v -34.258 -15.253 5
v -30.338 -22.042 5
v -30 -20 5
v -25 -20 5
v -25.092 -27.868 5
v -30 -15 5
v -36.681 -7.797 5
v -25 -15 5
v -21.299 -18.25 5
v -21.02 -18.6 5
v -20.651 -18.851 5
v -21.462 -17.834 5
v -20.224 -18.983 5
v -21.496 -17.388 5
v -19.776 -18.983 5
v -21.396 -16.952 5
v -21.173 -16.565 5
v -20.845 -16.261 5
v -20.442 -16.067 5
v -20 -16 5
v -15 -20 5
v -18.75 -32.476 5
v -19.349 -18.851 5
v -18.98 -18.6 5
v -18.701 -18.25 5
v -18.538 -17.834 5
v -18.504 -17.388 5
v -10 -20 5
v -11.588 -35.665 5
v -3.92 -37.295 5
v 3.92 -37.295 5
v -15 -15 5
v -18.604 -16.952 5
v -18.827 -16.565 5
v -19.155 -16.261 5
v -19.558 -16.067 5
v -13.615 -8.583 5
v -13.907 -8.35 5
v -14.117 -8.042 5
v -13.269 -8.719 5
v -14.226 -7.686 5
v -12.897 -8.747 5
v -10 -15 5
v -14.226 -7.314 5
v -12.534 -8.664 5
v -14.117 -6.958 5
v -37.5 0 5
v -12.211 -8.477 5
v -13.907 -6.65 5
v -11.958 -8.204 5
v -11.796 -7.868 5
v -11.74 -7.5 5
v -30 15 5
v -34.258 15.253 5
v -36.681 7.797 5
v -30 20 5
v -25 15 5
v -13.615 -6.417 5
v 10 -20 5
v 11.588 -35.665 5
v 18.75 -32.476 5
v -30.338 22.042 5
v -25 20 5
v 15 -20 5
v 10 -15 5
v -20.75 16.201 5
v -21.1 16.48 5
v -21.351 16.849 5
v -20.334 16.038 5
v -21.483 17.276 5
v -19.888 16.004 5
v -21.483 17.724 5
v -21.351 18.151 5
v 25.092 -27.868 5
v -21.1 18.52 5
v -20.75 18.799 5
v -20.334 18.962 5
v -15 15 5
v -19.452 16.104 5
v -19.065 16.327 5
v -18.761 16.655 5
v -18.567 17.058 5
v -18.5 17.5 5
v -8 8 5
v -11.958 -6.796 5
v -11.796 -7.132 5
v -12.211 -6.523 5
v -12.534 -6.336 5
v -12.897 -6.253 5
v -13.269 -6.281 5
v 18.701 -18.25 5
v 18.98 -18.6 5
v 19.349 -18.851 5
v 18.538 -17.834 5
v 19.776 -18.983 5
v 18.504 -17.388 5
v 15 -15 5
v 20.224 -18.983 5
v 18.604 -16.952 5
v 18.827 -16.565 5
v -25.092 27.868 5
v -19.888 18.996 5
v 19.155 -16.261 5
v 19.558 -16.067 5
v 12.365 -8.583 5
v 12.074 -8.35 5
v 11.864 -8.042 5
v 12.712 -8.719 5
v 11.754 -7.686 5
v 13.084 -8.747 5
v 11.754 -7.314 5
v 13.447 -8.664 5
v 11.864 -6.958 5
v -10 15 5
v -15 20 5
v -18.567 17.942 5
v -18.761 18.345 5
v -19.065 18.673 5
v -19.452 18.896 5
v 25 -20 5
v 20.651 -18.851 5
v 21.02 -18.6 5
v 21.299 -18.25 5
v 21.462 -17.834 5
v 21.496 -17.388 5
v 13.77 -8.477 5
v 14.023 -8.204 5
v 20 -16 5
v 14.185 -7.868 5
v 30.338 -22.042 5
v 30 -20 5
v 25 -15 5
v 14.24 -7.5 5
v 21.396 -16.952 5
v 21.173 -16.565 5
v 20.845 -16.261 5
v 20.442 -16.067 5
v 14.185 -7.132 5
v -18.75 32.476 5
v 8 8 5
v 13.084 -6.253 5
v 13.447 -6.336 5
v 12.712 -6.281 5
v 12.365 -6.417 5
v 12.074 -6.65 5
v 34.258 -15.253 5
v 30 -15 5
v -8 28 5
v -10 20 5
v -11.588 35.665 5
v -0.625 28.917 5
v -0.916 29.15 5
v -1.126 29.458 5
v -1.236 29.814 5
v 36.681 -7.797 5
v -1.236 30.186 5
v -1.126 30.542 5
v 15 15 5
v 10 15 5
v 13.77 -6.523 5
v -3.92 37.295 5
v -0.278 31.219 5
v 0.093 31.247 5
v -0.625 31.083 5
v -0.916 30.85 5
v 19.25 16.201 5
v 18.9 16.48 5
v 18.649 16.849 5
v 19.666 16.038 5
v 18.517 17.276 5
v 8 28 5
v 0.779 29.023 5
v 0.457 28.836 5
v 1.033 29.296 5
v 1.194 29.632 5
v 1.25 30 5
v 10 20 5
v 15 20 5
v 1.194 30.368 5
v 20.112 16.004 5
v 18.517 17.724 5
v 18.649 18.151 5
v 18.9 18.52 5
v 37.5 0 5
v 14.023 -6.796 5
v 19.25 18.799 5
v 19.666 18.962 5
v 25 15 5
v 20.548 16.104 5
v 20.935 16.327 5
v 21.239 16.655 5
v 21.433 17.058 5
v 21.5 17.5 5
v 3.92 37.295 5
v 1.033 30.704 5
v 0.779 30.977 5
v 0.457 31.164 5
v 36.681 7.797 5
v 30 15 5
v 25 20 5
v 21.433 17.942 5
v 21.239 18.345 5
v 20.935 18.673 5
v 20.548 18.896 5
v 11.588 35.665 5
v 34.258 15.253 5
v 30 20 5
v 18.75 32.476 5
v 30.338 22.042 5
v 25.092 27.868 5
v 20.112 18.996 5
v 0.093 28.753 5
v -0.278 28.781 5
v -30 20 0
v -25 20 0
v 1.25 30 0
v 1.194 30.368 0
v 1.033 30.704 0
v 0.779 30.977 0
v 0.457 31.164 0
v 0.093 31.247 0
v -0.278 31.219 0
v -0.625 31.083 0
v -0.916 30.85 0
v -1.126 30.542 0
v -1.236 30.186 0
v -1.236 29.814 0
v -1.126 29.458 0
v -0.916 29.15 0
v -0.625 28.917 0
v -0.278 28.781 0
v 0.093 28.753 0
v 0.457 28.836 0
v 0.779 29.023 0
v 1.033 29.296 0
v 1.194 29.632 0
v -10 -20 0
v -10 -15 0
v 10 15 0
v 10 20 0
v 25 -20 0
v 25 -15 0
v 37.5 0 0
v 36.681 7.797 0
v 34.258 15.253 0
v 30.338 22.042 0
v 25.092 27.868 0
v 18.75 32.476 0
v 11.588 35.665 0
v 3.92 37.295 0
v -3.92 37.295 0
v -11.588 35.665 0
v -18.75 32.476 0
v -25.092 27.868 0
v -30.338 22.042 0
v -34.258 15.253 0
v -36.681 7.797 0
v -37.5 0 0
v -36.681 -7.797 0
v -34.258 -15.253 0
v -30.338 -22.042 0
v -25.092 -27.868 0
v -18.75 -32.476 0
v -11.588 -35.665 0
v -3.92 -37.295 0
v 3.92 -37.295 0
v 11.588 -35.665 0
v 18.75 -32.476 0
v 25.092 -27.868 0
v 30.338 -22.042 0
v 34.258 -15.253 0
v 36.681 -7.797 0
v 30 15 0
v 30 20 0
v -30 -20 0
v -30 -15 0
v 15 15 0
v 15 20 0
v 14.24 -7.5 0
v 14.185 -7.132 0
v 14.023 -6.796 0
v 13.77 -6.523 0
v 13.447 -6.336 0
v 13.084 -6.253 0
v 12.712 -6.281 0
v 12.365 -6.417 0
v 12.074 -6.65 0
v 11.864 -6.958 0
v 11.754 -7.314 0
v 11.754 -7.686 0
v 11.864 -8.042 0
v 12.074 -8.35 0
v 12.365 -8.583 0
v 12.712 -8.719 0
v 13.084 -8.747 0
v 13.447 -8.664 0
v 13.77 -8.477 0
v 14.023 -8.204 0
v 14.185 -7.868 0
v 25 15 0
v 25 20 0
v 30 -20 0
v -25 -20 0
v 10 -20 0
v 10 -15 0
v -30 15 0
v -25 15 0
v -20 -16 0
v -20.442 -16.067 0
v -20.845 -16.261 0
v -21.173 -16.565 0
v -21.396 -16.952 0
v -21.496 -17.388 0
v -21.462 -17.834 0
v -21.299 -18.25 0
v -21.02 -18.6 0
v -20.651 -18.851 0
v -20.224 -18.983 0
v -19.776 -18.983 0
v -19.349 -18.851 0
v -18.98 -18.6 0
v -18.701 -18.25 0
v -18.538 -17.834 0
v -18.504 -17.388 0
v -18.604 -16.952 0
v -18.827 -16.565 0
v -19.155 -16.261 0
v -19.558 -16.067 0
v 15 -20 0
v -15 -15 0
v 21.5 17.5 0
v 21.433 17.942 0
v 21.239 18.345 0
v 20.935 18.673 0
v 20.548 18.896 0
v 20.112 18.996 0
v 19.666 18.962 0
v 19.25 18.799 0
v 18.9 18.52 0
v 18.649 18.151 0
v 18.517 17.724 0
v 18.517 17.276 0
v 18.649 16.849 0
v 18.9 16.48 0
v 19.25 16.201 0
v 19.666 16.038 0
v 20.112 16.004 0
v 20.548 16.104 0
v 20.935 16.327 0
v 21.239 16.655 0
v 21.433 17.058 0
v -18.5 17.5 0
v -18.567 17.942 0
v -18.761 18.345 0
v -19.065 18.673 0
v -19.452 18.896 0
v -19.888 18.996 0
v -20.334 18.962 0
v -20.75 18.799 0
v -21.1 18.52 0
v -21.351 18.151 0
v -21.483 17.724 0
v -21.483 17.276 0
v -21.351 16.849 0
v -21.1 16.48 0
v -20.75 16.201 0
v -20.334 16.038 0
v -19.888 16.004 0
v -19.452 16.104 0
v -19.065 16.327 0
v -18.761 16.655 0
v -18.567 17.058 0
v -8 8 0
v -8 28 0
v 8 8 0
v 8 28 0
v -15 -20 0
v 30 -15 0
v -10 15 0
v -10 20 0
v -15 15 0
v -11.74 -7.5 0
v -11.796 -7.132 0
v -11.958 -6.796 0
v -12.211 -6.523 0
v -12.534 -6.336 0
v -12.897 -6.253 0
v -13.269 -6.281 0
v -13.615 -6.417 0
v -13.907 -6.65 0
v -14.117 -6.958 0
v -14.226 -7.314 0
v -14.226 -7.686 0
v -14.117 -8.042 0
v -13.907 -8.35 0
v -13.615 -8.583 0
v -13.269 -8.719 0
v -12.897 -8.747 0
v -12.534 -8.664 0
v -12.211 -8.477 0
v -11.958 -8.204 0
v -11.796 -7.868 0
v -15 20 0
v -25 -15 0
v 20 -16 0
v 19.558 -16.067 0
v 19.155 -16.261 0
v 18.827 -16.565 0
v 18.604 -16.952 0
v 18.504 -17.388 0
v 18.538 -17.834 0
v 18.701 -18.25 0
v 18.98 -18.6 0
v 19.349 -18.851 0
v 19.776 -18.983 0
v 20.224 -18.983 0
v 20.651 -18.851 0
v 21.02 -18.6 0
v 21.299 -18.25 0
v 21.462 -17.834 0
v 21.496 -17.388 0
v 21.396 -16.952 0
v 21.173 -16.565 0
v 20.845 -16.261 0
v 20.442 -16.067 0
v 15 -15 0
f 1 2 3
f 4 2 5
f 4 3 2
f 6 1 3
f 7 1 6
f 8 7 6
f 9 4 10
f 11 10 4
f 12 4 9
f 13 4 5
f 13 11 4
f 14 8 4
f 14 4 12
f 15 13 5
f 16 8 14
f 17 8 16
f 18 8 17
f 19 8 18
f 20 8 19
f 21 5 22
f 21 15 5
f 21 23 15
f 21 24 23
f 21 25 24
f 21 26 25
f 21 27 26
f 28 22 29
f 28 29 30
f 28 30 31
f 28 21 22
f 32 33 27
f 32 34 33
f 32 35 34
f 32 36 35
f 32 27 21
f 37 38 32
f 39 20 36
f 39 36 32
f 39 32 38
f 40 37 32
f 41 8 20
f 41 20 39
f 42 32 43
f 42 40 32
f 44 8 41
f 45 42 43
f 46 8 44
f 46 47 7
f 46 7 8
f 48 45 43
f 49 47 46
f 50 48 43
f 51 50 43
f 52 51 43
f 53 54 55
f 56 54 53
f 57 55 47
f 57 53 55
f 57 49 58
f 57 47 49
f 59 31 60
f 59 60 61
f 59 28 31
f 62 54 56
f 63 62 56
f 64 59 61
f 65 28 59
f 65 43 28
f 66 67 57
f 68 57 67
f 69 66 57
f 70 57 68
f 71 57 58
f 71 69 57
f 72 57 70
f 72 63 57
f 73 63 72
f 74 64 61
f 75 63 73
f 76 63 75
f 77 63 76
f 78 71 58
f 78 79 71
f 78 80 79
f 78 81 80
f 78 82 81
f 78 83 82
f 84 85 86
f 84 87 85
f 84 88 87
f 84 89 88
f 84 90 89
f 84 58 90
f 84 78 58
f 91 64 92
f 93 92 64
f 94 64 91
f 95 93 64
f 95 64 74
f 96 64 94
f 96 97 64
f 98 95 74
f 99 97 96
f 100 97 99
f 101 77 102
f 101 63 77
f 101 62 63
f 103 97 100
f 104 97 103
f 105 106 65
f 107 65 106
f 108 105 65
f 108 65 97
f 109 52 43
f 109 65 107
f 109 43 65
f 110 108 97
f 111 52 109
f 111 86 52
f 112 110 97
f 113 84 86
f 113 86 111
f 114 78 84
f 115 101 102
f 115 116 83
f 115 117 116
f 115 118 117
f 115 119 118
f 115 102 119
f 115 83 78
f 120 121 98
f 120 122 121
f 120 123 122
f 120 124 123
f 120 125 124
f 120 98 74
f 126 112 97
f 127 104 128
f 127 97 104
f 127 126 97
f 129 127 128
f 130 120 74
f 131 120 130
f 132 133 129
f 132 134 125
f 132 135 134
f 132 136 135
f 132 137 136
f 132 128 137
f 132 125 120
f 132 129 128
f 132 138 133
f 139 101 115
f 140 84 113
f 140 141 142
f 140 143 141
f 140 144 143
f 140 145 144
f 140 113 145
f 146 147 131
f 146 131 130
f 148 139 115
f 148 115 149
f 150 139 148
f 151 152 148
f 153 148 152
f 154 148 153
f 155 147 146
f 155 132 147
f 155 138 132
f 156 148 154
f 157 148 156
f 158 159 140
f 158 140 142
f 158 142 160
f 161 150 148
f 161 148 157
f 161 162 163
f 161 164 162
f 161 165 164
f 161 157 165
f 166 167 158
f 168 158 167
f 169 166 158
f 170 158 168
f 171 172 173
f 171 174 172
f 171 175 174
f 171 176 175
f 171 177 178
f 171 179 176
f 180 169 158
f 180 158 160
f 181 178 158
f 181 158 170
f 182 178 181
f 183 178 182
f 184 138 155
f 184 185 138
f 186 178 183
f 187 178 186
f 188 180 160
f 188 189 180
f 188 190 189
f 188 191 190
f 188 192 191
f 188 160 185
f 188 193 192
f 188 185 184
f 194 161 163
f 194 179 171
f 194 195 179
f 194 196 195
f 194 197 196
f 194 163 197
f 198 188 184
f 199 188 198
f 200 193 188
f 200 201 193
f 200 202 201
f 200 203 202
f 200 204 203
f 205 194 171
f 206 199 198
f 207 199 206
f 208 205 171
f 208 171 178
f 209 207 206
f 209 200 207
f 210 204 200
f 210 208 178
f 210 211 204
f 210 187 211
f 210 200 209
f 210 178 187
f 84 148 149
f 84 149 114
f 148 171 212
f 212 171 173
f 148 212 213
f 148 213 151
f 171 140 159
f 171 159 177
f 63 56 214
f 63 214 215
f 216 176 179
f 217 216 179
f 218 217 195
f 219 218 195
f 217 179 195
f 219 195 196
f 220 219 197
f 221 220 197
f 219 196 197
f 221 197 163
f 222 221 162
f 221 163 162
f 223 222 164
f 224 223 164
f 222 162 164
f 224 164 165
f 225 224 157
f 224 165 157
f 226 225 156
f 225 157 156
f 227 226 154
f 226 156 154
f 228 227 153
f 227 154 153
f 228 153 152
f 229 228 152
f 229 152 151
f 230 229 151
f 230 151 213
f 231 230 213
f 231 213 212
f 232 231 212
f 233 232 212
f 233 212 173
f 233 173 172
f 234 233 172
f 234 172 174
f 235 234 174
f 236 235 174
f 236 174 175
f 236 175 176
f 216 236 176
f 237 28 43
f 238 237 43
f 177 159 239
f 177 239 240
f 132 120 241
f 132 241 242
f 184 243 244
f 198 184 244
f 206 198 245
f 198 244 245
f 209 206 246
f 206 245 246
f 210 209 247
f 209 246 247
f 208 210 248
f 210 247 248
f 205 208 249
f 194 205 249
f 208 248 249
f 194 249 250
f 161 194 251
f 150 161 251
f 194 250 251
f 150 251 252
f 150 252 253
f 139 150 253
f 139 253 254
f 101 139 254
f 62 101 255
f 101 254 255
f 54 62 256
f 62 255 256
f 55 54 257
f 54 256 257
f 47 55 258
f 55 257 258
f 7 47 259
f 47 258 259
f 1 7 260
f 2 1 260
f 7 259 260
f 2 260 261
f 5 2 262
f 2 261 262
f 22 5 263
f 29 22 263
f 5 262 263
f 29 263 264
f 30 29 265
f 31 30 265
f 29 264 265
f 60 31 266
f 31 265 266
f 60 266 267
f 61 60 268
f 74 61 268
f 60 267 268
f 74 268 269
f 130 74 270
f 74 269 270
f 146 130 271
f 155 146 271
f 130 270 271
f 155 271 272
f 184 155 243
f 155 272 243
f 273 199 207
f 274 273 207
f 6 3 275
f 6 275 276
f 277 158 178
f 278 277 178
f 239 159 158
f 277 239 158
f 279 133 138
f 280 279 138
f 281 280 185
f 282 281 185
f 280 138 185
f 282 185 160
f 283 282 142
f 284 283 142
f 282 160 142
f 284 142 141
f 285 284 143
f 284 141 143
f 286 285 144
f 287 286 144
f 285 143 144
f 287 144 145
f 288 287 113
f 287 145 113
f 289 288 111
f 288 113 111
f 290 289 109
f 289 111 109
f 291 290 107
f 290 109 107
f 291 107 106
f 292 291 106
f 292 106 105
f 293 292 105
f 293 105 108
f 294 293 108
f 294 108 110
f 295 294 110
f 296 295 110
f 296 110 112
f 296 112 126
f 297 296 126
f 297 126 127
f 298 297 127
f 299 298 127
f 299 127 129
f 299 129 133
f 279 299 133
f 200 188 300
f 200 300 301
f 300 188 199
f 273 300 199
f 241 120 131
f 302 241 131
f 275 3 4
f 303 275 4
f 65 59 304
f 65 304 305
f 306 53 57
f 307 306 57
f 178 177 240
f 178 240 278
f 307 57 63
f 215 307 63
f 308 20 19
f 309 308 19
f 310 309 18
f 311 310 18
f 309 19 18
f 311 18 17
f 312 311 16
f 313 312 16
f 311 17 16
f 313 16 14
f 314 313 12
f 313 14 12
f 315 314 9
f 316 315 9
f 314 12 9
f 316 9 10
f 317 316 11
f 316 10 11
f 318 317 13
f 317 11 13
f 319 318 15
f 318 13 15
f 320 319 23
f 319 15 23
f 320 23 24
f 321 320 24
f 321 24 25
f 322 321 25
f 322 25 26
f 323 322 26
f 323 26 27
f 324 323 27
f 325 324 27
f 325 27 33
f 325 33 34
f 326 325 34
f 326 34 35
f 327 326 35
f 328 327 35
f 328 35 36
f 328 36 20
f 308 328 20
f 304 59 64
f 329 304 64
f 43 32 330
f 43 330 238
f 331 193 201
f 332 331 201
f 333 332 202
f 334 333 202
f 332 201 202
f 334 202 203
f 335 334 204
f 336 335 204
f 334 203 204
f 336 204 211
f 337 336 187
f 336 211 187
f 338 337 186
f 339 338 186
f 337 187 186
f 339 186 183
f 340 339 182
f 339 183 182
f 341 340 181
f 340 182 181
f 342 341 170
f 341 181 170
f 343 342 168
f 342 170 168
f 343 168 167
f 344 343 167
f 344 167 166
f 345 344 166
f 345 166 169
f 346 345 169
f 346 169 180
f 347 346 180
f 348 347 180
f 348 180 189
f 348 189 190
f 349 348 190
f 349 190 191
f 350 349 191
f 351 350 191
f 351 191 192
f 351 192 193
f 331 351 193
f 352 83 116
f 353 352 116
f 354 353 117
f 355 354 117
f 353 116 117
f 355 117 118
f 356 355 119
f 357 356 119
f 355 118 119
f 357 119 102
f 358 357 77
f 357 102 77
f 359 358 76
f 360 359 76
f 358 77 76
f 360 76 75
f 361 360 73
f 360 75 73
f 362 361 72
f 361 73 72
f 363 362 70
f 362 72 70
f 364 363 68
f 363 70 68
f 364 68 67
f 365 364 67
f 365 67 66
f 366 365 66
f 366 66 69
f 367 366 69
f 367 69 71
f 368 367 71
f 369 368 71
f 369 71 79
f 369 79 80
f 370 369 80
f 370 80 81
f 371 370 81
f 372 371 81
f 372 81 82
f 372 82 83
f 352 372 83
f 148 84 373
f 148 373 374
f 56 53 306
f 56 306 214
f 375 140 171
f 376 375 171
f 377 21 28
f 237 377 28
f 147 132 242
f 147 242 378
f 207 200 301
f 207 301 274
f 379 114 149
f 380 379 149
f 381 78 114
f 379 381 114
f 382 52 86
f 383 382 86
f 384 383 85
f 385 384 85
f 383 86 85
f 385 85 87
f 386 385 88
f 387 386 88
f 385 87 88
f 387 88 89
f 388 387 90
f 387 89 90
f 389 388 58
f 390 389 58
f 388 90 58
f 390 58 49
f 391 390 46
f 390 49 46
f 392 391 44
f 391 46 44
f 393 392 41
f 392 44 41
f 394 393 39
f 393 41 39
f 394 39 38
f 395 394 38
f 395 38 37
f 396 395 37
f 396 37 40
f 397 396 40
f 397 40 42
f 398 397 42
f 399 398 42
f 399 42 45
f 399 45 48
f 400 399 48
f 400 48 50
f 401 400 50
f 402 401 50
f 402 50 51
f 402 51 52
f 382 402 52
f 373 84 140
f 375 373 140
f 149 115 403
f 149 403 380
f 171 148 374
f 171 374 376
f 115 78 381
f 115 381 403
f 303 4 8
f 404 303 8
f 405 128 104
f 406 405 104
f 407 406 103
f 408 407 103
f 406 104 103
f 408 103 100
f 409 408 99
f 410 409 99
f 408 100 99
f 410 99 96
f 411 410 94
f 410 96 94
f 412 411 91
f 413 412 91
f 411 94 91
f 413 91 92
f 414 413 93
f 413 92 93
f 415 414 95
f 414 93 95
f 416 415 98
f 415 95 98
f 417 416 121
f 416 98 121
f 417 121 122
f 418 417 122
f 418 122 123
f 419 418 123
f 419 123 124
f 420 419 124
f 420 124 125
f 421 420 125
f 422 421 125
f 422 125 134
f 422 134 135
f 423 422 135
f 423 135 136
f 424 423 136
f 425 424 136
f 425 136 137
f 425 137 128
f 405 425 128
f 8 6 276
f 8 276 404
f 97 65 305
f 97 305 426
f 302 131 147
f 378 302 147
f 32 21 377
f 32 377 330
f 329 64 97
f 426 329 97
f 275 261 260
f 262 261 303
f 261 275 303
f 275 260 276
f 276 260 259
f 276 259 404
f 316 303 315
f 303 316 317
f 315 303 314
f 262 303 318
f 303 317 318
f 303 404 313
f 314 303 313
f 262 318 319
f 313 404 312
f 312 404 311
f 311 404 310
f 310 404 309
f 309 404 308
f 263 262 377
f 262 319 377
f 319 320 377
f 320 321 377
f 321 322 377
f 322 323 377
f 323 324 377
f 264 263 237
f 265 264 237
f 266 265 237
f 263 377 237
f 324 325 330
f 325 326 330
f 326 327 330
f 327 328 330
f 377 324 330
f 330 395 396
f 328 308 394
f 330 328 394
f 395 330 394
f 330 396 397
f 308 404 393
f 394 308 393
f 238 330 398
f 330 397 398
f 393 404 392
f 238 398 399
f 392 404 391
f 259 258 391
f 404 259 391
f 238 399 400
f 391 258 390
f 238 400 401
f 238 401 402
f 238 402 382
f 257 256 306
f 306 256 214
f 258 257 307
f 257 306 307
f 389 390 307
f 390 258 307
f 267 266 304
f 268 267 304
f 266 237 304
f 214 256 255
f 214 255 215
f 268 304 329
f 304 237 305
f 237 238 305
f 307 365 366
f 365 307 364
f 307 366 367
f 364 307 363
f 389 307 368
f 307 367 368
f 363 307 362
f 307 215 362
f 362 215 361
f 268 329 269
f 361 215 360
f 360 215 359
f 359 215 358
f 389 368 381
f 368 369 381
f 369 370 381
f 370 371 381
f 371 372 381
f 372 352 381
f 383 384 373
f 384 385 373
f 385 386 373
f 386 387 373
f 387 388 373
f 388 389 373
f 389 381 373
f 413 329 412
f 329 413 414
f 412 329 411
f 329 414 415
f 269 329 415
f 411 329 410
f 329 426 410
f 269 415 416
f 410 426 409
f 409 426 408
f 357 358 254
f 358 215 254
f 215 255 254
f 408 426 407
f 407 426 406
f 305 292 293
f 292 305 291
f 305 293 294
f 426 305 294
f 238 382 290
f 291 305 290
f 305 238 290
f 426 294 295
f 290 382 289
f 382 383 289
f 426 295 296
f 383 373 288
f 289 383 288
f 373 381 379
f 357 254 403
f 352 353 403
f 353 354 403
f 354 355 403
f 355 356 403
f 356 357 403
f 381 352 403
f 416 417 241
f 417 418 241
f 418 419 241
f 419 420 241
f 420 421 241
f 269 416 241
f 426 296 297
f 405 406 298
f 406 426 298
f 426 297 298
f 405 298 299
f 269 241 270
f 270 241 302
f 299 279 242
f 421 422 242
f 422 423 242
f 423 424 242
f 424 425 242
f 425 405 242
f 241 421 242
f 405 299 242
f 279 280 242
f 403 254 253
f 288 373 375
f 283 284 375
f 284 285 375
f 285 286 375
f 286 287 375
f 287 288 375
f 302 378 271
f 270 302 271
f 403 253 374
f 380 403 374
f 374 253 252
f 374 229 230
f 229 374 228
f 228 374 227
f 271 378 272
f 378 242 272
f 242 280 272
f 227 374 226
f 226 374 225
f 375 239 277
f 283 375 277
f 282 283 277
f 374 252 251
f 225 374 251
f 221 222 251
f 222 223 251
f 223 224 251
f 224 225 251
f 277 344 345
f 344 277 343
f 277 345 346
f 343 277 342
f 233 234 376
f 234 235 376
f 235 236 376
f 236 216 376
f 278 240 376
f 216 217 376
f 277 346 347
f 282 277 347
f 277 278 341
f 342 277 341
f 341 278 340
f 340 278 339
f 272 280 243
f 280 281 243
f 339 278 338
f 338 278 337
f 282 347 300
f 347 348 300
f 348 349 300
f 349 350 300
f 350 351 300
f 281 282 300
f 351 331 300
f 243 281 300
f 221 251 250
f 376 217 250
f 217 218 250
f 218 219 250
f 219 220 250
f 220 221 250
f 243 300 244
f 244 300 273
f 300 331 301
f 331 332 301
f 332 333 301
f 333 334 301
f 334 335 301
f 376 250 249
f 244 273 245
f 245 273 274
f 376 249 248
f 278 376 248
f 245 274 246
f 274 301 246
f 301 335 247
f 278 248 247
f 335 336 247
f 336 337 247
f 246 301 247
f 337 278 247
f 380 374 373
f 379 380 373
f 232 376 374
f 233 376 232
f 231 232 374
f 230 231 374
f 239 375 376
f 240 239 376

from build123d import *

# Parameters (mm, degrees)
SKETCH1_R           = 37.5
BOSS_EXTRUDE1_DEPTH = 5
SKETCH9_R           = 1.25
SKETCH9_R_2         = 1.5
SKETCH9_W           = 16
SKETCH9_H           = 20
SKETCH9_W_2         = 5
SKETCH9_H_2         = 5
CUT_EXTRUDE5_DEPTH  = 54.268189382


with BuildPart() as part:
    # Sketch1 → Boss-Extrude1 (new body)
    with BuildSketch(Plane.XY):
        Circle(SKETCH1_R)
    extrude(amount=BOSS_EXTRUDE1_DEPTH)

    # Sketch9 → Cut-Extrude5 (cut, through all)
    with BuildSketch(Plane.XY.offset(5)):
        with Locations((0, 30)):
            Circle(SKETCH9_R)
        with Locations((12.990381057, -7.5)):
            Circle(SKETCH9_R)
        with Locations((-12.990381057, -7.5)):
            Circle(SKETCH9_R)
        with Locations((20, 17.5)):
            Circle(SKETCH9_R_2)
        with Locations((-20, 17.5)):
            Circle(SKETCH9_R_2)
        with Locations(Location((20, -17.5, 0), (0, 0, 90))):
            Circle(SKETCH9_R_2)
        with Locations(Location((-20, -17.5, 0), (0, 0, 90))):
            Circle(SKETCH9_R_2)
        with Locations((0, 18)):
            Rectangle(SKETCH9_W, SKETCH9_H)
        with Locations((12.5, 17.5)):
            Rectangle(SKETCH9_W_2, SKETCH9_H_2)
        with Locations((27.5, 17.5)):
            Rectangle(SKETCH9_W_2, SKETCH9_H_2)
        with Locations((-27.5, 17.5)):
            Rectangle(SKETCH9_W_2, SKETCH9_H_2)
        with Locations((-12.5, 17.5)):
            Rectangle(SKETCH9_W_2, SKETCH9_H_2)
        with Locations((12.5, -17.5)):
            Rectangle(SKETCH9_W_2, SKETCH9_H_2)
        with Locations((27.5, -17.5)):
            Rectangle(SKETCH9_W_2, SKETCH9_H_2)
        with Locations((-27.5, -17.5)):
            Rectangle(SKETCH9_W_2, SKETCH9_H_2)
        with Locations((-12.5, -17.5)):
            Rectangle(SKETCH9_W_2, SKETCH9_H_2)
    extrude(amount=-CUT_EXTRUDE5_DEPTH, mode=Mode.SUBTRACT)


solid = part.part
